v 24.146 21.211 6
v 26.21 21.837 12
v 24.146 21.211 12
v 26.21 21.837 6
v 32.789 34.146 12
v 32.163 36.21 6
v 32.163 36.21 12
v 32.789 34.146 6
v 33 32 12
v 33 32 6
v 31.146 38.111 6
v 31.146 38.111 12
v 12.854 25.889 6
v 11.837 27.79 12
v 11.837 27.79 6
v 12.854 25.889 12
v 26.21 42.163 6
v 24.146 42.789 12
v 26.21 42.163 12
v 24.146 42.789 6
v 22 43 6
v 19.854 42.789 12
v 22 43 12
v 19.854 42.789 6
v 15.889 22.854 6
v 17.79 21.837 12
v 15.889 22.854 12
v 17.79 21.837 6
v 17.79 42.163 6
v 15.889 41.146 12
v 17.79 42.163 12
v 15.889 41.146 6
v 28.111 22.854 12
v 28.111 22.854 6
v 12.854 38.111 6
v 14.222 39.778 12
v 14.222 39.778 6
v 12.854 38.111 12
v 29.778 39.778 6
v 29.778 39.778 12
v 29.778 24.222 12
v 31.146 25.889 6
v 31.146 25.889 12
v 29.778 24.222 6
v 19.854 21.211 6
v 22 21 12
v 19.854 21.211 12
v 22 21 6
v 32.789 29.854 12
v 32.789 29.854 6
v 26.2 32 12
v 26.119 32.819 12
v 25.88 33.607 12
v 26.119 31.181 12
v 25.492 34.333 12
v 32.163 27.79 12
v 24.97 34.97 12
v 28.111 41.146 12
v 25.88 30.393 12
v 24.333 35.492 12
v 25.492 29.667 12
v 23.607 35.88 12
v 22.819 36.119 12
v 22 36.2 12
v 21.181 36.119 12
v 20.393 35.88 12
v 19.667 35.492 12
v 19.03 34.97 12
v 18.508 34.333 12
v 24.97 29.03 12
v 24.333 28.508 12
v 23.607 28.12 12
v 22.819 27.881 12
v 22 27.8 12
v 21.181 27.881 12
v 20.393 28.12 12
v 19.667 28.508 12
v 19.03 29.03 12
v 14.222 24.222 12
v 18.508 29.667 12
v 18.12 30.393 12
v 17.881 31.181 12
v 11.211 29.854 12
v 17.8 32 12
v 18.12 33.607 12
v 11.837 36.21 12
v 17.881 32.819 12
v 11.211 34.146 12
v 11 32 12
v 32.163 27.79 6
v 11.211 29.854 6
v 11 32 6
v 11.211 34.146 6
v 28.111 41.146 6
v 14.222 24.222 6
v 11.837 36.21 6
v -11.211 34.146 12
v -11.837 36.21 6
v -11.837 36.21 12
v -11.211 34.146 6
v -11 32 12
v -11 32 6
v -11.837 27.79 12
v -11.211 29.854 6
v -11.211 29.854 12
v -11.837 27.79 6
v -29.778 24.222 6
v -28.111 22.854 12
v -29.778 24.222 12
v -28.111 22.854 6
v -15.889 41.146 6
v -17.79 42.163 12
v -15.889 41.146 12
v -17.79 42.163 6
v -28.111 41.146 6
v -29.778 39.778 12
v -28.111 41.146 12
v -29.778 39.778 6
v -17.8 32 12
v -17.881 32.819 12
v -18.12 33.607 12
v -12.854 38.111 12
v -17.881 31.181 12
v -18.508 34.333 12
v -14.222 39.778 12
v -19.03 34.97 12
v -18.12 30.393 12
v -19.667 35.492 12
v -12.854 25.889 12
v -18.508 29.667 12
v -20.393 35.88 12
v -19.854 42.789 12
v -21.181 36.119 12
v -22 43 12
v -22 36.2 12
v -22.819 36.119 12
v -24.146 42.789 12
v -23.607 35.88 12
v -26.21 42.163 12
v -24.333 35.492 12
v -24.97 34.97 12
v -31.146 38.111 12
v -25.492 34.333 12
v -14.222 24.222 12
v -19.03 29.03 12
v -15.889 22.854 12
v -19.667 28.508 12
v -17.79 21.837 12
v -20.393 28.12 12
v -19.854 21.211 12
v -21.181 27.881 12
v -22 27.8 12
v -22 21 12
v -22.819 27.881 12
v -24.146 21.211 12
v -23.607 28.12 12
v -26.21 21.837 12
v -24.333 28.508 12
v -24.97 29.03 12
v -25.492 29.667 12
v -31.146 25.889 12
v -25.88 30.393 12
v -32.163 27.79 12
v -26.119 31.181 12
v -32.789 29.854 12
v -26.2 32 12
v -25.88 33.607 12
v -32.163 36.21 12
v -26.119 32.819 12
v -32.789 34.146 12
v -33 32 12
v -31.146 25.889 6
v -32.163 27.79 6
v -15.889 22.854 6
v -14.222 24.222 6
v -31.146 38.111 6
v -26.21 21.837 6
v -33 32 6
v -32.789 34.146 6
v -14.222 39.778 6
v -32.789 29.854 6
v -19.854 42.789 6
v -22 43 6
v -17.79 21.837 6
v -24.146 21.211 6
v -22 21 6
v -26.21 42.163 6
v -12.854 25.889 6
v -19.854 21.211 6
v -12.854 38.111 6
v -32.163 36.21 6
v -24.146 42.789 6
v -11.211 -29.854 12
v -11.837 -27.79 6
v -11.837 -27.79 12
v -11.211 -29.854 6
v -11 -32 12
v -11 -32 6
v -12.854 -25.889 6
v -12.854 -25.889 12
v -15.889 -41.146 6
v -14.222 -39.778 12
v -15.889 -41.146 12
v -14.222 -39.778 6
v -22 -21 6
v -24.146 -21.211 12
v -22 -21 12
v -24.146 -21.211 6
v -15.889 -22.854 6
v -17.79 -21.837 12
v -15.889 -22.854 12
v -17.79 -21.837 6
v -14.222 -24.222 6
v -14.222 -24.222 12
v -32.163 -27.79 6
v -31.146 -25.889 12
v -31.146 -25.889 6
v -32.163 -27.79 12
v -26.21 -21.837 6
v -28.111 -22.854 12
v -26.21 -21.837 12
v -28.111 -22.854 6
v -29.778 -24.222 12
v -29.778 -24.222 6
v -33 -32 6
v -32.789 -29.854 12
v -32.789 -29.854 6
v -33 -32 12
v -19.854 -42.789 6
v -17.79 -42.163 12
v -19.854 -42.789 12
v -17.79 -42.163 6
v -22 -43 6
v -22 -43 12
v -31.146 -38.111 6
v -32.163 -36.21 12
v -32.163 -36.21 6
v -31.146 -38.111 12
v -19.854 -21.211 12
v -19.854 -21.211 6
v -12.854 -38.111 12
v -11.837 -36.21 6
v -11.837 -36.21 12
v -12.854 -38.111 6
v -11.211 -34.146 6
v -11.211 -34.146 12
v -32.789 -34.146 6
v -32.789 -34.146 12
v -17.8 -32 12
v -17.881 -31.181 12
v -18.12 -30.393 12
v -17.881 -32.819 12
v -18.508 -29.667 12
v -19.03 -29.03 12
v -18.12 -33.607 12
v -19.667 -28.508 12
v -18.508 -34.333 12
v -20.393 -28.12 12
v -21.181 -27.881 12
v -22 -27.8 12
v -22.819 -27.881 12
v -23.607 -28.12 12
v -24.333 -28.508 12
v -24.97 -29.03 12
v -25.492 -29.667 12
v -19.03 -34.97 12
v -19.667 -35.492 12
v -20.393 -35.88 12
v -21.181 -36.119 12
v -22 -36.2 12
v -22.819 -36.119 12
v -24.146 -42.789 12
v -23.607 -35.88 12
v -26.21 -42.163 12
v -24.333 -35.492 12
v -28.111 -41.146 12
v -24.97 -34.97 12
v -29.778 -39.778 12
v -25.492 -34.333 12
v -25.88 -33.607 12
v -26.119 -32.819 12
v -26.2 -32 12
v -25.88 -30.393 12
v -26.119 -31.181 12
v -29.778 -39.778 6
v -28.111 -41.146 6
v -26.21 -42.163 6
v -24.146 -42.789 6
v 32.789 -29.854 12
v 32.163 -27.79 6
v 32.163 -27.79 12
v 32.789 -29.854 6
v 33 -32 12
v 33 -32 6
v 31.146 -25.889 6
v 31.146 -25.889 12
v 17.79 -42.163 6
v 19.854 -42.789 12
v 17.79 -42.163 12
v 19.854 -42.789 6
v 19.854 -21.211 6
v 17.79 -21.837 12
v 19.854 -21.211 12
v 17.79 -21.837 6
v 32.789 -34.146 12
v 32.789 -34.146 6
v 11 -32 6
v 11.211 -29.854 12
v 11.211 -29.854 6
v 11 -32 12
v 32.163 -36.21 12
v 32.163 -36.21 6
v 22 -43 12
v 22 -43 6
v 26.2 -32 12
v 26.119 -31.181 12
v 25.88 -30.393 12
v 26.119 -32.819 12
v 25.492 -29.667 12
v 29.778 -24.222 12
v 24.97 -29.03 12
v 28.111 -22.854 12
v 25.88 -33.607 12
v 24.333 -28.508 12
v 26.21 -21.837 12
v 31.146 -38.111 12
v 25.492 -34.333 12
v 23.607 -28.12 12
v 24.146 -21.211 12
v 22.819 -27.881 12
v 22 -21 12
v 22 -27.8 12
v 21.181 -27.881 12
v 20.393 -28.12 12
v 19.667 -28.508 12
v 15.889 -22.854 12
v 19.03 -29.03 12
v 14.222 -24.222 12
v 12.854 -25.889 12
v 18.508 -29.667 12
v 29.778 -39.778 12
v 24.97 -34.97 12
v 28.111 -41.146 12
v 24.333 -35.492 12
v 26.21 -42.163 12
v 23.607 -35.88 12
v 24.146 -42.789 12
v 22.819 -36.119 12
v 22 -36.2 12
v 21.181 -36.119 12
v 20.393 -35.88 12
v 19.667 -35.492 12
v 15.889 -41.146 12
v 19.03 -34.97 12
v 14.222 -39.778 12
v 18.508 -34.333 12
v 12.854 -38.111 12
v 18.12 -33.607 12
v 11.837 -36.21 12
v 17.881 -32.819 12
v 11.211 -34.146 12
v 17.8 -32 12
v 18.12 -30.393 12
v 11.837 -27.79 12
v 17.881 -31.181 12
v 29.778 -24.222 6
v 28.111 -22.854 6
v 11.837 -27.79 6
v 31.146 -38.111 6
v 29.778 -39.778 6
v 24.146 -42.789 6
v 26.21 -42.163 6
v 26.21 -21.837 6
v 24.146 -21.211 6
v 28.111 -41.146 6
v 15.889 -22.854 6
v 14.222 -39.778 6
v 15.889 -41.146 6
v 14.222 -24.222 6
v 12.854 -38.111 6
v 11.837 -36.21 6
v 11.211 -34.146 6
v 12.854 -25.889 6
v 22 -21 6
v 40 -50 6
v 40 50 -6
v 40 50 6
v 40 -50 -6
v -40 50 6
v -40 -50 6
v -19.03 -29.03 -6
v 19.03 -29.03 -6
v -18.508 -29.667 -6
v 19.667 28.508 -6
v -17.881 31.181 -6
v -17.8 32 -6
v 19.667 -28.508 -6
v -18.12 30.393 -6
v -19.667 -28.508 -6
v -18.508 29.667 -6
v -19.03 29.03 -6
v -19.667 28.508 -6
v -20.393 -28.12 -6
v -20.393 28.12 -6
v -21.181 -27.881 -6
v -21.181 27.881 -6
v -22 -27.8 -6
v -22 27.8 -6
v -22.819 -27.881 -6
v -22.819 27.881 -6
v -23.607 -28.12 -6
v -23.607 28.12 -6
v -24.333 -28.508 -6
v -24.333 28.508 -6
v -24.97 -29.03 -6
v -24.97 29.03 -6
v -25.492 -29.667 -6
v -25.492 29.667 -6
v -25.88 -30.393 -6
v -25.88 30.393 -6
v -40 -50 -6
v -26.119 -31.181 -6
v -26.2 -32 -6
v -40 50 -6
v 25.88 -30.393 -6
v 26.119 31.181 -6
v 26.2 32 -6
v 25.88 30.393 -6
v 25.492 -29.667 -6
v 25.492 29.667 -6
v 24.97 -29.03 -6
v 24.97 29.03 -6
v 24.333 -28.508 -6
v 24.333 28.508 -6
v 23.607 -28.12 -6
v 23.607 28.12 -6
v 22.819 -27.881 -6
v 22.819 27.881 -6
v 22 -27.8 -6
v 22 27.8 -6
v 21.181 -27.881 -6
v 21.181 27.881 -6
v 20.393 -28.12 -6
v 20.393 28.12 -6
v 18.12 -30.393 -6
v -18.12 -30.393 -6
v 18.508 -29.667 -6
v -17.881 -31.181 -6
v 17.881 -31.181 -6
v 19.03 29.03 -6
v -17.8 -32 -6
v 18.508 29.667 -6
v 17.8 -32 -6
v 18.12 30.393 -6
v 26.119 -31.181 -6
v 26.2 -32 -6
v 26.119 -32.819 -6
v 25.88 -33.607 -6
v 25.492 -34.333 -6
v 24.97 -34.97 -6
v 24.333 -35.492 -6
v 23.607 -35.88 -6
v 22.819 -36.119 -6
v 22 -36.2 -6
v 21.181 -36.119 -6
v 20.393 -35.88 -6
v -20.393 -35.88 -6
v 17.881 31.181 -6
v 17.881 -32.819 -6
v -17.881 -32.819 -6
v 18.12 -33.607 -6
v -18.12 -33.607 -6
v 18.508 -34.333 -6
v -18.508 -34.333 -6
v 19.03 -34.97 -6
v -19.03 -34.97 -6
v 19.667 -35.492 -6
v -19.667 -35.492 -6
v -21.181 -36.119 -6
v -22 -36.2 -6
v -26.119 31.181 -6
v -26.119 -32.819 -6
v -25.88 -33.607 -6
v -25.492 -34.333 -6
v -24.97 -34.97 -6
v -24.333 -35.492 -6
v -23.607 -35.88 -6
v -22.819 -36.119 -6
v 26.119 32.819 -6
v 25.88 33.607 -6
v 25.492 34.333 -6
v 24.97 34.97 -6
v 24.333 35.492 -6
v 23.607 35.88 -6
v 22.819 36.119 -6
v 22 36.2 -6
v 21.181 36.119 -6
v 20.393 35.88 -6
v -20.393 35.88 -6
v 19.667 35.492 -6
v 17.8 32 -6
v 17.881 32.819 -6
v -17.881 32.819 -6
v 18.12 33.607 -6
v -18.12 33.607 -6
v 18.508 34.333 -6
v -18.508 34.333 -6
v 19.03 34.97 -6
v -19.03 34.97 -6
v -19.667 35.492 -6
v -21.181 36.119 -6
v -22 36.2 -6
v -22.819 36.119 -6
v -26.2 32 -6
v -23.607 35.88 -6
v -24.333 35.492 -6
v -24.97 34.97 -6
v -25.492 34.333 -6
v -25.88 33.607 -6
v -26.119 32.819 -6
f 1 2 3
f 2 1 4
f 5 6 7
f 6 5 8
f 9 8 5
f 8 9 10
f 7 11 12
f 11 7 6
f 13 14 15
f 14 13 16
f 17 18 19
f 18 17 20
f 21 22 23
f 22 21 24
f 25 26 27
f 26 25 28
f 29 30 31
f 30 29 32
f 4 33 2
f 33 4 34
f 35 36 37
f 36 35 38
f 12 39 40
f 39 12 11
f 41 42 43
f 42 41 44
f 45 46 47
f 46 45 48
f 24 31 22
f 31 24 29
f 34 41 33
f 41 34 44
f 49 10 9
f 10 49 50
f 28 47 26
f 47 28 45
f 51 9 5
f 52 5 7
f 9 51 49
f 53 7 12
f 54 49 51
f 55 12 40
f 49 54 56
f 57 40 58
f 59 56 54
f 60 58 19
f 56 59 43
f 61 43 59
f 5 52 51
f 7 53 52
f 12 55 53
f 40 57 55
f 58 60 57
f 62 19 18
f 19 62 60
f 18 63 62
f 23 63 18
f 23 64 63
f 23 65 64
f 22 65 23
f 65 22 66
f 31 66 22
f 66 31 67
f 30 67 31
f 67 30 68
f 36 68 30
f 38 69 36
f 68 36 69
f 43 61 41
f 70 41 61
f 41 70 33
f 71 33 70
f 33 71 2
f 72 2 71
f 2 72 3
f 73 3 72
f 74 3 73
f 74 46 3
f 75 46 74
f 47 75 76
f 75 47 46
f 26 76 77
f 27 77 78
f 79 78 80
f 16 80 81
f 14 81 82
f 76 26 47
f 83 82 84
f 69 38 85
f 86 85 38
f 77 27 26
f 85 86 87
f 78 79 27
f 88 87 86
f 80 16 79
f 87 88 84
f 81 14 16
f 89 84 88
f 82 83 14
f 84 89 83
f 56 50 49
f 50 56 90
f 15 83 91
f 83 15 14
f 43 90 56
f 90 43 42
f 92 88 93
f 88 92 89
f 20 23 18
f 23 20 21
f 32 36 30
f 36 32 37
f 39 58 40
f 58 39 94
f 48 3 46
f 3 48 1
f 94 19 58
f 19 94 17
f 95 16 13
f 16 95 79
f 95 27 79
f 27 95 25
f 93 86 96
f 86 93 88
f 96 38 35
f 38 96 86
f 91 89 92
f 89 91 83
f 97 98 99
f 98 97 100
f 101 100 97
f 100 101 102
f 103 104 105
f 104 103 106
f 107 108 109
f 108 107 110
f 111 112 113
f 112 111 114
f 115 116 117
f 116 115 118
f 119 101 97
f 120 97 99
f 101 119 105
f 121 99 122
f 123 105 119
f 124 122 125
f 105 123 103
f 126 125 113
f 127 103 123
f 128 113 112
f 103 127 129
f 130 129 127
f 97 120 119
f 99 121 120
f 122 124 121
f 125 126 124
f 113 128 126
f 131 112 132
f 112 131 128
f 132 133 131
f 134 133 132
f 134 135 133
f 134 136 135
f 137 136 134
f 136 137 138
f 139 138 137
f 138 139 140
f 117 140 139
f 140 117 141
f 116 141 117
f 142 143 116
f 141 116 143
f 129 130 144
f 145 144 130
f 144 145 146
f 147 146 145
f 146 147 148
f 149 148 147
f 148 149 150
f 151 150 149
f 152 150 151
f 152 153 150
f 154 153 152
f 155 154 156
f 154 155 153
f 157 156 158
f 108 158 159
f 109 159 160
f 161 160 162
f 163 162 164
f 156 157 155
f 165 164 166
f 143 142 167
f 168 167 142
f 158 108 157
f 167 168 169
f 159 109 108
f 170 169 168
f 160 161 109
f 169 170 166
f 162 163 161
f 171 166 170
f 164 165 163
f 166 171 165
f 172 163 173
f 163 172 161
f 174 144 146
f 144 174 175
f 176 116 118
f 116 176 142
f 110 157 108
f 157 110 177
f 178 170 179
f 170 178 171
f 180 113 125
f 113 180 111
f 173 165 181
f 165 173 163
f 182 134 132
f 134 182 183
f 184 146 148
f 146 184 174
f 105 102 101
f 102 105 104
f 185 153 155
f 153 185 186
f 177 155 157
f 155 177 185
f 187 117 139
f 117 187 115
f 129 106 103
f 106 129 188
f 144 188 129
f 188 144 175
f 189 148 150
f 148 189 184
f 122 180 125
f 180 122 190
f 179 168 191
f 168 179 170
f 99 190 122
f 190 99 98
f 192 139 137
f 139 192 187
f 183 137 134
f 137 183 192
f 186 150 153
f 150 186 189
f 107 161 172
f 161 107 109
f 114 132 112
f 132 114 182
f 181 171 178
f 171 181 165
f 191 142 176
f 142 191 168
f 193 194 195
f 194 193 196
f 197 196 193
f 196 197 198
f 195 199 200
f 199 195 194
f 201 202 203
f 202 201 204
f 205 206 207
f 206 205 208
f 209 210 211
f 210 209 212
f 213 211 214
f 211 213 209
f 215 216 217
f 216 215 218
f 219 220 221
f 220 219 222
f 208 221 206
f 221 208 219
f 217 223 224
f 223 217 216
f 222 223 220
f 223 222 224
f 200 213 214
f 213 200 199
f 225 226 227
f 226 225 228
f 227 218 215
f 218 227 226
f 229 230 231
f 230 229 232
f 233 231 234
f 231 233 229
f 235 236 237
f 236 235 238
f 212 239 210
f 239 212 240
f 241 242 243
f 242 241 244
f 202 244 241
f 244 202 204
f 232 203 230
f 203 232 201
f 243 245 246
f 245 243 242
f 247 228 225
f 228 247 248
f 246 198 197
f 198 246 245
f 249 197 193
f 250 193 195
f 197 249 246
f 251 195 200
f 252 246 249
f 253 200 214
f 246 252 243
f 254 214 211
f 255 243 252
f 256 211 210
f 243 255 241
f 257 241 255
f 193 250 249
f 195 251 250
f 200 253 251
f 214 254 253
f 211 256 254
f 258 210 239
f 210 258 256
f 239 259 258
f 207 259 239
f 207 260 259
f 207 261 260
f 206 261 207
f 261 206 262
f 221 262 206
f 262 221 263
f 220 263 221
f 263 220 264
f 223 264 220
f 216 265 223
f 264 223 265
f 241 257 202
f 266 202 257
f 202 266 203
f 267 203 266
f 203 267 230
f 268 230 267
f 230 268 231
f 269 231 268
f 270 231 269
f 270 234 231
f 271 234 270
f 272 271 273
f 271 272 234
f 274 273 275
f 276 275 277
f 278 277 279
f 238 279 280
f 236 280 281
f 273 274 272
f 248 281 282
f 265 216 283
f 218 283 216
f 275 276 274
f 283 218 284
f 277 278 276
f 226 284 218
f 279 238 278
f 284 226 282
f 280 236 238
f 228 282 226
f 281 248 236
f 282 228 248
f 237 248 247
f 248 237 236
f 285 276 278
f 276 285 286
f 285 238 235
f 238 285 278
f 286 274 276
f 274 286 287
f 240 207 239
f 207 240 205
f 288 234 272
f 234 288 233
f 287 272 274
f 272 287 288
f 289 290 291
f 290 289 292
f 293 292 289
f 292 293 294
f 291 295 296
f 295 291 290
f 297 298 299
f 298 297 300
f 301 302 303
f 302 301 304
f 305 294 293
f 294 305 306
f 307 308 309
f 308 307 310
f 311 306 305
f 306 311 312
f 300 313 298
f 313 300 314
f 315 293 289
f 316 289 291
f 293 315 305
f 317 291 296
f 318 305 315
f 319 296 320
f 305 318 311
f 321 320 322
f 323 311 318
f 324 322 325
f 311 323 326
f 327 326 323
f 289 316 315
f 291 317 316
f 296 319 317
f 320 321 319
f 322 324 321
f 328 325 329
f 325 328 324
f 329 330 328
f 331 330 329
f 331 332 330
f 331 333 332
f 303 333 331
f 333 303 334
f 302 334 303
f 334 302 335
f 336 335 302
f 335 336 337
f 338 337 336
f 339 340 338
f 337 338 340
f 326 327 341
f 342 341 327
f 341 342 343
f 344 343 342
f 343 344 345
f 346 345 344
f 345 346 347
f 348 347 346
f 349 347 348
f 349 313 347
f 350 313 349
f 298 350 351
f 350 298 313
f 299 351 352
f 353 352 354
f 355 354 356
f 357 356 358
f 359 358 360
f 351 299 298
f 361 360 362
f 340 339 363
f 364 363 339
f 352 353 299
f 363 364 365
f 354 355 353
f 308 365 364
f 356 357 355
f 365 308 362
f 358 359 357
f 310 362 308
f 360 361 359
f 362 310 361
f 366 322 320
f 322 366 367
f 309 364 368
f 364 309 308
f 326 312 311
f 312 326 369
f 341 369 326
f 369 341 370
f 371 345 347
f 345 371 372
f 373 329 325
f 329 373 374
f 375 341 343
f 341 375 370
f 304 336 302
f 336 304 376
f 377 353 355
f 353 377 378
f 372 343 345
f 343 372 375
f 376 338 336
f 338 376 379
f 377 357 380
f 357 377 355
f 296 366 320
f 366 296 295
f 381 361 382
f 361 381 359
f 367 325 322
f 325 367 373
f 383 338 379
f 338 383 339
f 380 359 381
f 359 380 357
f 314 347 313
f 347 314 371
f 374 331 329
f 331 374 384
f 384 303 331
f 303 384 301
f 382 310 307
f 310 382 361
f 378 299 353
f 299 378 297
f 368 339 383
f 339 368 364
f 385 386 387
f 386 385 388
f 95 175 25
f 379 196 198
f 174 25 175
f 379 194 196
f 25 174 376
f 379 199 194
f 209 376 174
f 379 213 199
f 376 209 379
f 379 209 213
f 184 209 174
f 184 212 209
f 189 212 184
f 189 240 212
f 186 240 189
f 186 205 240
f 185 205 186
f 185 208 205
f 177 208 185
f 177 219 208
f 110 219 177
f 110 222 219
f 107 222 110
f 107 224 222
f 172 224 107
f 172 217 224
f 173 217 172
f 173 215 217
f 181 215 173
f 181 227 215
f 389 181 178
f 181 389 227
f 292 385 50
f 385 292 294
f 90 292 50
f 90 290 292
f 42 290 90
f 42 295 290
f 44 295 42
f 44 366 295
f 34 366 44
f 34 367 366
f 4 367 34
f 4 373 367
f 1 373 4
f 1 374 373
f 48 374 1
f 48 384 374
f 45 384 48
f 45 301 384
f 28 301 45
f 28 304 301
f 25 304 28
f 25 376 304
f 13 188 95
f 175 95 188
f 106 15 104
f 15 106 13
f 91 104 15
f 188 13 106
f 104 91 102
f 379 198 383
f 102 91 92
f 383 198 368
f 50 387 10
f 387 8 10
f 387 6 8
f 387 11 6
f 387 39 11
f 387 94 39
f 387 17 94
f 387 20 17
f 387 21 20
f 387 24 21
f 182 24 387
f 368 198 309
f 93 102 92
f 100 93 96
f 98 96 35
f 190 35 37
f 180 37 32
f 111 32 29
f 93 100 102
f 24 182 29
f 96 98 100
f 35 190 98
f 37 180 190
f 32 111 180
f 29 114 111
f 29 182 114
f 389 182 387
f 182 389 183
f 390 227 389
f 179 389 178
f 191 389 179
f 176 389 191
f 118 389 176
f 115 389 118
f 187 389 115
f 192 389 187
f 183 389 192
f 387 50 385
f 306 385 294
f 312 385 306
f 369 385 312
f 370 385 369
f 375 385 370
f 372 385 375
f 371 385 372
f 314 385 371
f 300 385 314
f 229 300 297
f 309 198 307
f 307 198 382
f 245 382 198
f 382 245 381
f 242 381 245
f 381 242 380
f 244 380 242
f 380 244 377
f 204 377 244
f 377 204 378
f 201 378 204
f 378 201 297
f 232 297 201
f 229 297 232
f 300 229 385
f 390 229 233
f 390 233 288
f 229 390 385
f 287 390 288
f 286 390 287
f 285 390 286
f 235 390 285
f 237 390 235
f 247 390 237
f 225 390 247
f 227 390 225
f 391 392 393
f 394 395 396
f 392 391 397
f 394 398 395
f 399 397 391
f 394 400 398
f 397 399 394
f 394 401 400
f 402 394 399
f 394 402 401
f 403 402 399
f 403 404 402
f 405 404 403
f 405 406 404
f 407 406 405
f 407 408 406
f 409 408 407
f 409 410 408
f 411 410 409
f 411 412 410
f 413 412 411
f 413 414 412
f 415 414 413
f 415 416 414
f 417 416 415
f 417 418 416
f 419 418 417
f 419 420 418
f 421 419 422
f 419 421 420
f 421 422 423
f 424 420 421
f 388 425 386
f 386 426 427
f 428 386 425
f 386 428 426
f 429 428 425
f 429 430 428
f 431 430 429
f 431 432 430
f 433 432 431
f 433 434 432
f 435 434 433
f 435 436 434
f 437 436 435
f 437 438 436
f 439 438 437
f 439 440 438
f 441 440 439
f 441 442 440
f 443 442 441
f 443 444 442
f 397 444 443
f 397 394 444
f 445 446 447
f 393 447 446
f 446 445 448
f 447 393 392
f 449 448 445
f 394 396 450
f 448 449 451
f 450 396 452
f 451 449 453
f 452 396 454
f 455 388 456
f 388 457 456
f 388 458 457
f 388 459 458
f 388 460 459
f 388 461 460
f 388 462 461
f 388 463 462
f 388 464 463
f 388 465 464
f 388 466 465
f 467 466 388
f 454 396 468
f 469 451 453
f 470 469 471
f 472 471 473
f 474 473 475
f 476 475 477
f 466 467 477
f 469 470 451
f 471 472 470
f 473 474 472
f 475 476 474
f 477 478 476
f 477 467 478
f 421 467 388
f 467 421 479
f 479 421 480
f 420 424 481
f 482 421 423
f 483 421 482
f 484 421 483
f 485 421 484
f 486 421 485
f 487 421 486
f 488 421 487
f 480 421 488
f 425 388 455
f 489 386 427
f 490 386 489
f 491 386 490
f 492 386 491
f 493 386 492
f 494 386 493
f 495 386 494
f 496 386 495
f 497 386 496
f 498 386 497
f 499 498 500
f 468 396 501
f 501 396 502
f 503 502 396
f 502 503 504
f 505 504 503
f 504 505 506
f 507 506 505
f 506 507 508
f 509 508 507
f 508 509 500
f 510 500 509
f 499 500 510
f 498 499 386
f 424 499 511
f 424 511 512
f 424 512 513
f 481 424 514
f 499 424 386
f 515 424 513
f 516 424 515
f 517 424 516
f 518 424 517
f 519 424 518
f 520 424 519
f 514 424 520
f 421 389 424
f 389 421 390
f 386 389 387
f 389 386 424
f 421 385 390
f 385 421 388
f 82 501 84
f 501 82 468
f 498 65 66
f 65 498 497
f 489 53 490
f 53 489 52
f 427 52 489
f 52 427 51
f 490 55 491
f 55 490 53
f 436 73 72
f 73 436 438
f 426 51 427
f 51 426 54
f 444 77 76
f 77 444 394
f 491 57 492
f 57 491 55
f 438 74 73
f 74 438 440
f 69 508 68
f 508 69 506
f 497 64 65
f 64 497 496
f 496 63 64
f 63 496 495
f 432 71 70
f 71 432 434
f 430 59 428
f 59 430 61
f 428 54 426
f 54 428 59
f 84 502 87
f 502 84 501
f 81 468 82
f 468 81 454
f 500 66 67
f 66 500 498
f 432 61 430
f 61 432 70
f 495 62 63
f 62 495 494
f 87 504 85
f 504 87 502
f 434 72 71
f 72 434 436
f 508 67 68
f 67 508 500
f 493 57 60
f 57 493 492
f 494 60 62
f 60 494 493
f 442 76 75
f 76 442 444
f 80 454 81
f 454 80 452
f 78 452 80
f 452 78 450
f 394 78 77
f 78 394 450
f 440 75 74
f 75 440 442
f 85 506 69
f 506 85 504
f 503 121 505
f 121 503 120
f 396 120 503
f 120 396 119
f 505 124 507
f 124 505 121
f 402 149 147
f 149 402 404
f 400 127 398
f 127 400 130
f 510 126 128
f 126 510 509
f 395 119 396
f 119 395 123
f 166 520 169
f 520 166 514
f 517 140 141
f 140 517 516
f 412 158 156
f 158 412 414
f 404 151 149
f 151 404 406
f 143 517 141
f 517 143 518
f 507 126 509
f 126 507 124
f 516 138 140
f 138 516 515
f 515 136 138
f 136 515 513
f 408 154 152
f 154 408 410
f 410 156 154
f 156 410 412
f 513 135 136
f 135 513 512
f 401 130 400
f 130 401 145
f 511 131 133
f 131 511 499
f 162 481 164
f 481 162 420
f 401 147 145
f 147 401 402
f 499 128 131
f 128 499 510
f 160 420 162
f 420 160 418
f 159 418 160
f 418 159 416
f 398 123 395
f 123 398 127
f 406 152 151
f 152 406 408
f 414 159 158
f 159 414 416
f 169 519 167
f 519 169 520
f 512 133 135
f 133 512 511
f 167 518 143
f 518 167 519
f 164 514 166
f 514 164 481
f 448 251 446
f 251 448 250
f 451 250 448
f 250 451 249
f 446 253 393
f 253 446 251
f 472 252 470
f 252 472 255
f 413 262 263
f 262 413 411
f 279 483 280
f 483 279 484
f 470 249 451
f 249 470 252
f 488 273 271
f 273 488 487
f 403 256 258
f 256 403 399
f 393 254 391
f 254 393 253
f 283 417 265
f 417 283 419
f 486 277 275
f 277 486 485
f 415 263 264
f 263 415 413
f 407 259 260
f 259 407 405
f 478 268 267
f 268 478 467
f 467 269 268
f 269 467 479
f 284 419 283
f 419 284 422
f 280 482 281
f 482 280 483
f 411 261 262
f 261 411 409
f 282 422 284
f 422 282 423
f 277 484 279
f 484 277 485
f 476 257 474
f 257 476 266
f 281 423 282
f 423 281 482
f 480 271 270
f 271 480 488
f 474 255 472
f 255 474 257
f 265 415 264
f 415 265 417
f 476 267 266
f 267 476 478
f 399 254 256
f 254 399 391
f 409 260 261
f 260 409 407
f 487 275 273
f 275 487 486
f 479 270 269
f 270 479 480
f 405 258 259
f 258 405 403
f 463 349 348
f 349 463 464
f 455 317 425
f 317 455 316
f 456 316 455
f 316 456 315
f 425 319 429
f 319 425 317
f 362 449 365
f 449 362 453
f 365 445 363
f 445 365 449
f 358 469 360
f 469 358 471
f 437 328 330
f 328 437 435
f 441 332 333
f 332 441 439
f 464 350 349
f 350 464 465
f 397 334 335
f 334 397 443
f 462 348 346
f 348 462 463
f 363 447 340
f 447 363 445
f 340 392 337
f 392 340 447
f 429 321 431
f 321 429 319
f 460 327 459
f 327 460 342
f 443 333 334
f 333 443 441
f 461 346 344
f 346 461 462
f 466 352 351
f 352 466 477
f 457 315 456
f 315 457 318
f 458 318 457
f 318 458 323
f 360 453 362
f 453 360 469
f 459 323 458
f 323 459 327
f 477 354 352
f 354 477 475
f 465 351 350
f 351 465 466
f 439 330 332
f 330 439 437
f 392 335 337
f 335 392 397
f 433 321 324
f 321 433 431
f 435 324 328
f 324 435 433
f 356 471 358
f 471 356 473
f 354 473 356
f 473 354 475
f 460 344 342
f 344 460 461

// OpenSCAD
$fn = 32;

// ----------------------------------------------------------------------
// Anchor pads 80 x 100 x 18
// four corner bosses with anchor holes
// ----------------------------------------------------------------------

// --- parameters (mm) ---
plate = [80, 100, 12];  // base plate size (x, y, z)
pads = 4;               // boss count, one per corner
edge = 18;              // boss centre offset from the plate edge
boss_d = 22;            // boss diameter
boss_h = 6;             // boss height above the base plate
hole_d = 8.4;           // hole diameter

// --- derived feature positions (mm) ---
height = plate[2] + boss_h;      // = 18   overall height of the part
corner_x = plate[0] / 2 - edge;  // = 22   boss centre X
corner_y = plate[1] / 2 - edge;  // = 32   boss centre Y
feature_centers = [
  [corner_x, corner_y],
  [-corner_x, corner_y],
  [-corner_x, -corner_y],
  [corner_x, -corner_y]
];   // boss centres, anchor holes are drilled there

// base plate, four bosses standing on it, anchor holes all the way through
difference() {
  union() {
    cube(plate, center = true);
    for (centre = feature_centers)
      translate([centre[0], centre[1], plate[2] / 2 - 1])
        cylinder(d = boss_d, h = boss_h + 1);
  }
  for (centre = feature_centers)
    translate([centre[0], centre[1], -height])
      cylinder(d = hole_d, h = 2 * height + 2);  // through boss and plate
}
